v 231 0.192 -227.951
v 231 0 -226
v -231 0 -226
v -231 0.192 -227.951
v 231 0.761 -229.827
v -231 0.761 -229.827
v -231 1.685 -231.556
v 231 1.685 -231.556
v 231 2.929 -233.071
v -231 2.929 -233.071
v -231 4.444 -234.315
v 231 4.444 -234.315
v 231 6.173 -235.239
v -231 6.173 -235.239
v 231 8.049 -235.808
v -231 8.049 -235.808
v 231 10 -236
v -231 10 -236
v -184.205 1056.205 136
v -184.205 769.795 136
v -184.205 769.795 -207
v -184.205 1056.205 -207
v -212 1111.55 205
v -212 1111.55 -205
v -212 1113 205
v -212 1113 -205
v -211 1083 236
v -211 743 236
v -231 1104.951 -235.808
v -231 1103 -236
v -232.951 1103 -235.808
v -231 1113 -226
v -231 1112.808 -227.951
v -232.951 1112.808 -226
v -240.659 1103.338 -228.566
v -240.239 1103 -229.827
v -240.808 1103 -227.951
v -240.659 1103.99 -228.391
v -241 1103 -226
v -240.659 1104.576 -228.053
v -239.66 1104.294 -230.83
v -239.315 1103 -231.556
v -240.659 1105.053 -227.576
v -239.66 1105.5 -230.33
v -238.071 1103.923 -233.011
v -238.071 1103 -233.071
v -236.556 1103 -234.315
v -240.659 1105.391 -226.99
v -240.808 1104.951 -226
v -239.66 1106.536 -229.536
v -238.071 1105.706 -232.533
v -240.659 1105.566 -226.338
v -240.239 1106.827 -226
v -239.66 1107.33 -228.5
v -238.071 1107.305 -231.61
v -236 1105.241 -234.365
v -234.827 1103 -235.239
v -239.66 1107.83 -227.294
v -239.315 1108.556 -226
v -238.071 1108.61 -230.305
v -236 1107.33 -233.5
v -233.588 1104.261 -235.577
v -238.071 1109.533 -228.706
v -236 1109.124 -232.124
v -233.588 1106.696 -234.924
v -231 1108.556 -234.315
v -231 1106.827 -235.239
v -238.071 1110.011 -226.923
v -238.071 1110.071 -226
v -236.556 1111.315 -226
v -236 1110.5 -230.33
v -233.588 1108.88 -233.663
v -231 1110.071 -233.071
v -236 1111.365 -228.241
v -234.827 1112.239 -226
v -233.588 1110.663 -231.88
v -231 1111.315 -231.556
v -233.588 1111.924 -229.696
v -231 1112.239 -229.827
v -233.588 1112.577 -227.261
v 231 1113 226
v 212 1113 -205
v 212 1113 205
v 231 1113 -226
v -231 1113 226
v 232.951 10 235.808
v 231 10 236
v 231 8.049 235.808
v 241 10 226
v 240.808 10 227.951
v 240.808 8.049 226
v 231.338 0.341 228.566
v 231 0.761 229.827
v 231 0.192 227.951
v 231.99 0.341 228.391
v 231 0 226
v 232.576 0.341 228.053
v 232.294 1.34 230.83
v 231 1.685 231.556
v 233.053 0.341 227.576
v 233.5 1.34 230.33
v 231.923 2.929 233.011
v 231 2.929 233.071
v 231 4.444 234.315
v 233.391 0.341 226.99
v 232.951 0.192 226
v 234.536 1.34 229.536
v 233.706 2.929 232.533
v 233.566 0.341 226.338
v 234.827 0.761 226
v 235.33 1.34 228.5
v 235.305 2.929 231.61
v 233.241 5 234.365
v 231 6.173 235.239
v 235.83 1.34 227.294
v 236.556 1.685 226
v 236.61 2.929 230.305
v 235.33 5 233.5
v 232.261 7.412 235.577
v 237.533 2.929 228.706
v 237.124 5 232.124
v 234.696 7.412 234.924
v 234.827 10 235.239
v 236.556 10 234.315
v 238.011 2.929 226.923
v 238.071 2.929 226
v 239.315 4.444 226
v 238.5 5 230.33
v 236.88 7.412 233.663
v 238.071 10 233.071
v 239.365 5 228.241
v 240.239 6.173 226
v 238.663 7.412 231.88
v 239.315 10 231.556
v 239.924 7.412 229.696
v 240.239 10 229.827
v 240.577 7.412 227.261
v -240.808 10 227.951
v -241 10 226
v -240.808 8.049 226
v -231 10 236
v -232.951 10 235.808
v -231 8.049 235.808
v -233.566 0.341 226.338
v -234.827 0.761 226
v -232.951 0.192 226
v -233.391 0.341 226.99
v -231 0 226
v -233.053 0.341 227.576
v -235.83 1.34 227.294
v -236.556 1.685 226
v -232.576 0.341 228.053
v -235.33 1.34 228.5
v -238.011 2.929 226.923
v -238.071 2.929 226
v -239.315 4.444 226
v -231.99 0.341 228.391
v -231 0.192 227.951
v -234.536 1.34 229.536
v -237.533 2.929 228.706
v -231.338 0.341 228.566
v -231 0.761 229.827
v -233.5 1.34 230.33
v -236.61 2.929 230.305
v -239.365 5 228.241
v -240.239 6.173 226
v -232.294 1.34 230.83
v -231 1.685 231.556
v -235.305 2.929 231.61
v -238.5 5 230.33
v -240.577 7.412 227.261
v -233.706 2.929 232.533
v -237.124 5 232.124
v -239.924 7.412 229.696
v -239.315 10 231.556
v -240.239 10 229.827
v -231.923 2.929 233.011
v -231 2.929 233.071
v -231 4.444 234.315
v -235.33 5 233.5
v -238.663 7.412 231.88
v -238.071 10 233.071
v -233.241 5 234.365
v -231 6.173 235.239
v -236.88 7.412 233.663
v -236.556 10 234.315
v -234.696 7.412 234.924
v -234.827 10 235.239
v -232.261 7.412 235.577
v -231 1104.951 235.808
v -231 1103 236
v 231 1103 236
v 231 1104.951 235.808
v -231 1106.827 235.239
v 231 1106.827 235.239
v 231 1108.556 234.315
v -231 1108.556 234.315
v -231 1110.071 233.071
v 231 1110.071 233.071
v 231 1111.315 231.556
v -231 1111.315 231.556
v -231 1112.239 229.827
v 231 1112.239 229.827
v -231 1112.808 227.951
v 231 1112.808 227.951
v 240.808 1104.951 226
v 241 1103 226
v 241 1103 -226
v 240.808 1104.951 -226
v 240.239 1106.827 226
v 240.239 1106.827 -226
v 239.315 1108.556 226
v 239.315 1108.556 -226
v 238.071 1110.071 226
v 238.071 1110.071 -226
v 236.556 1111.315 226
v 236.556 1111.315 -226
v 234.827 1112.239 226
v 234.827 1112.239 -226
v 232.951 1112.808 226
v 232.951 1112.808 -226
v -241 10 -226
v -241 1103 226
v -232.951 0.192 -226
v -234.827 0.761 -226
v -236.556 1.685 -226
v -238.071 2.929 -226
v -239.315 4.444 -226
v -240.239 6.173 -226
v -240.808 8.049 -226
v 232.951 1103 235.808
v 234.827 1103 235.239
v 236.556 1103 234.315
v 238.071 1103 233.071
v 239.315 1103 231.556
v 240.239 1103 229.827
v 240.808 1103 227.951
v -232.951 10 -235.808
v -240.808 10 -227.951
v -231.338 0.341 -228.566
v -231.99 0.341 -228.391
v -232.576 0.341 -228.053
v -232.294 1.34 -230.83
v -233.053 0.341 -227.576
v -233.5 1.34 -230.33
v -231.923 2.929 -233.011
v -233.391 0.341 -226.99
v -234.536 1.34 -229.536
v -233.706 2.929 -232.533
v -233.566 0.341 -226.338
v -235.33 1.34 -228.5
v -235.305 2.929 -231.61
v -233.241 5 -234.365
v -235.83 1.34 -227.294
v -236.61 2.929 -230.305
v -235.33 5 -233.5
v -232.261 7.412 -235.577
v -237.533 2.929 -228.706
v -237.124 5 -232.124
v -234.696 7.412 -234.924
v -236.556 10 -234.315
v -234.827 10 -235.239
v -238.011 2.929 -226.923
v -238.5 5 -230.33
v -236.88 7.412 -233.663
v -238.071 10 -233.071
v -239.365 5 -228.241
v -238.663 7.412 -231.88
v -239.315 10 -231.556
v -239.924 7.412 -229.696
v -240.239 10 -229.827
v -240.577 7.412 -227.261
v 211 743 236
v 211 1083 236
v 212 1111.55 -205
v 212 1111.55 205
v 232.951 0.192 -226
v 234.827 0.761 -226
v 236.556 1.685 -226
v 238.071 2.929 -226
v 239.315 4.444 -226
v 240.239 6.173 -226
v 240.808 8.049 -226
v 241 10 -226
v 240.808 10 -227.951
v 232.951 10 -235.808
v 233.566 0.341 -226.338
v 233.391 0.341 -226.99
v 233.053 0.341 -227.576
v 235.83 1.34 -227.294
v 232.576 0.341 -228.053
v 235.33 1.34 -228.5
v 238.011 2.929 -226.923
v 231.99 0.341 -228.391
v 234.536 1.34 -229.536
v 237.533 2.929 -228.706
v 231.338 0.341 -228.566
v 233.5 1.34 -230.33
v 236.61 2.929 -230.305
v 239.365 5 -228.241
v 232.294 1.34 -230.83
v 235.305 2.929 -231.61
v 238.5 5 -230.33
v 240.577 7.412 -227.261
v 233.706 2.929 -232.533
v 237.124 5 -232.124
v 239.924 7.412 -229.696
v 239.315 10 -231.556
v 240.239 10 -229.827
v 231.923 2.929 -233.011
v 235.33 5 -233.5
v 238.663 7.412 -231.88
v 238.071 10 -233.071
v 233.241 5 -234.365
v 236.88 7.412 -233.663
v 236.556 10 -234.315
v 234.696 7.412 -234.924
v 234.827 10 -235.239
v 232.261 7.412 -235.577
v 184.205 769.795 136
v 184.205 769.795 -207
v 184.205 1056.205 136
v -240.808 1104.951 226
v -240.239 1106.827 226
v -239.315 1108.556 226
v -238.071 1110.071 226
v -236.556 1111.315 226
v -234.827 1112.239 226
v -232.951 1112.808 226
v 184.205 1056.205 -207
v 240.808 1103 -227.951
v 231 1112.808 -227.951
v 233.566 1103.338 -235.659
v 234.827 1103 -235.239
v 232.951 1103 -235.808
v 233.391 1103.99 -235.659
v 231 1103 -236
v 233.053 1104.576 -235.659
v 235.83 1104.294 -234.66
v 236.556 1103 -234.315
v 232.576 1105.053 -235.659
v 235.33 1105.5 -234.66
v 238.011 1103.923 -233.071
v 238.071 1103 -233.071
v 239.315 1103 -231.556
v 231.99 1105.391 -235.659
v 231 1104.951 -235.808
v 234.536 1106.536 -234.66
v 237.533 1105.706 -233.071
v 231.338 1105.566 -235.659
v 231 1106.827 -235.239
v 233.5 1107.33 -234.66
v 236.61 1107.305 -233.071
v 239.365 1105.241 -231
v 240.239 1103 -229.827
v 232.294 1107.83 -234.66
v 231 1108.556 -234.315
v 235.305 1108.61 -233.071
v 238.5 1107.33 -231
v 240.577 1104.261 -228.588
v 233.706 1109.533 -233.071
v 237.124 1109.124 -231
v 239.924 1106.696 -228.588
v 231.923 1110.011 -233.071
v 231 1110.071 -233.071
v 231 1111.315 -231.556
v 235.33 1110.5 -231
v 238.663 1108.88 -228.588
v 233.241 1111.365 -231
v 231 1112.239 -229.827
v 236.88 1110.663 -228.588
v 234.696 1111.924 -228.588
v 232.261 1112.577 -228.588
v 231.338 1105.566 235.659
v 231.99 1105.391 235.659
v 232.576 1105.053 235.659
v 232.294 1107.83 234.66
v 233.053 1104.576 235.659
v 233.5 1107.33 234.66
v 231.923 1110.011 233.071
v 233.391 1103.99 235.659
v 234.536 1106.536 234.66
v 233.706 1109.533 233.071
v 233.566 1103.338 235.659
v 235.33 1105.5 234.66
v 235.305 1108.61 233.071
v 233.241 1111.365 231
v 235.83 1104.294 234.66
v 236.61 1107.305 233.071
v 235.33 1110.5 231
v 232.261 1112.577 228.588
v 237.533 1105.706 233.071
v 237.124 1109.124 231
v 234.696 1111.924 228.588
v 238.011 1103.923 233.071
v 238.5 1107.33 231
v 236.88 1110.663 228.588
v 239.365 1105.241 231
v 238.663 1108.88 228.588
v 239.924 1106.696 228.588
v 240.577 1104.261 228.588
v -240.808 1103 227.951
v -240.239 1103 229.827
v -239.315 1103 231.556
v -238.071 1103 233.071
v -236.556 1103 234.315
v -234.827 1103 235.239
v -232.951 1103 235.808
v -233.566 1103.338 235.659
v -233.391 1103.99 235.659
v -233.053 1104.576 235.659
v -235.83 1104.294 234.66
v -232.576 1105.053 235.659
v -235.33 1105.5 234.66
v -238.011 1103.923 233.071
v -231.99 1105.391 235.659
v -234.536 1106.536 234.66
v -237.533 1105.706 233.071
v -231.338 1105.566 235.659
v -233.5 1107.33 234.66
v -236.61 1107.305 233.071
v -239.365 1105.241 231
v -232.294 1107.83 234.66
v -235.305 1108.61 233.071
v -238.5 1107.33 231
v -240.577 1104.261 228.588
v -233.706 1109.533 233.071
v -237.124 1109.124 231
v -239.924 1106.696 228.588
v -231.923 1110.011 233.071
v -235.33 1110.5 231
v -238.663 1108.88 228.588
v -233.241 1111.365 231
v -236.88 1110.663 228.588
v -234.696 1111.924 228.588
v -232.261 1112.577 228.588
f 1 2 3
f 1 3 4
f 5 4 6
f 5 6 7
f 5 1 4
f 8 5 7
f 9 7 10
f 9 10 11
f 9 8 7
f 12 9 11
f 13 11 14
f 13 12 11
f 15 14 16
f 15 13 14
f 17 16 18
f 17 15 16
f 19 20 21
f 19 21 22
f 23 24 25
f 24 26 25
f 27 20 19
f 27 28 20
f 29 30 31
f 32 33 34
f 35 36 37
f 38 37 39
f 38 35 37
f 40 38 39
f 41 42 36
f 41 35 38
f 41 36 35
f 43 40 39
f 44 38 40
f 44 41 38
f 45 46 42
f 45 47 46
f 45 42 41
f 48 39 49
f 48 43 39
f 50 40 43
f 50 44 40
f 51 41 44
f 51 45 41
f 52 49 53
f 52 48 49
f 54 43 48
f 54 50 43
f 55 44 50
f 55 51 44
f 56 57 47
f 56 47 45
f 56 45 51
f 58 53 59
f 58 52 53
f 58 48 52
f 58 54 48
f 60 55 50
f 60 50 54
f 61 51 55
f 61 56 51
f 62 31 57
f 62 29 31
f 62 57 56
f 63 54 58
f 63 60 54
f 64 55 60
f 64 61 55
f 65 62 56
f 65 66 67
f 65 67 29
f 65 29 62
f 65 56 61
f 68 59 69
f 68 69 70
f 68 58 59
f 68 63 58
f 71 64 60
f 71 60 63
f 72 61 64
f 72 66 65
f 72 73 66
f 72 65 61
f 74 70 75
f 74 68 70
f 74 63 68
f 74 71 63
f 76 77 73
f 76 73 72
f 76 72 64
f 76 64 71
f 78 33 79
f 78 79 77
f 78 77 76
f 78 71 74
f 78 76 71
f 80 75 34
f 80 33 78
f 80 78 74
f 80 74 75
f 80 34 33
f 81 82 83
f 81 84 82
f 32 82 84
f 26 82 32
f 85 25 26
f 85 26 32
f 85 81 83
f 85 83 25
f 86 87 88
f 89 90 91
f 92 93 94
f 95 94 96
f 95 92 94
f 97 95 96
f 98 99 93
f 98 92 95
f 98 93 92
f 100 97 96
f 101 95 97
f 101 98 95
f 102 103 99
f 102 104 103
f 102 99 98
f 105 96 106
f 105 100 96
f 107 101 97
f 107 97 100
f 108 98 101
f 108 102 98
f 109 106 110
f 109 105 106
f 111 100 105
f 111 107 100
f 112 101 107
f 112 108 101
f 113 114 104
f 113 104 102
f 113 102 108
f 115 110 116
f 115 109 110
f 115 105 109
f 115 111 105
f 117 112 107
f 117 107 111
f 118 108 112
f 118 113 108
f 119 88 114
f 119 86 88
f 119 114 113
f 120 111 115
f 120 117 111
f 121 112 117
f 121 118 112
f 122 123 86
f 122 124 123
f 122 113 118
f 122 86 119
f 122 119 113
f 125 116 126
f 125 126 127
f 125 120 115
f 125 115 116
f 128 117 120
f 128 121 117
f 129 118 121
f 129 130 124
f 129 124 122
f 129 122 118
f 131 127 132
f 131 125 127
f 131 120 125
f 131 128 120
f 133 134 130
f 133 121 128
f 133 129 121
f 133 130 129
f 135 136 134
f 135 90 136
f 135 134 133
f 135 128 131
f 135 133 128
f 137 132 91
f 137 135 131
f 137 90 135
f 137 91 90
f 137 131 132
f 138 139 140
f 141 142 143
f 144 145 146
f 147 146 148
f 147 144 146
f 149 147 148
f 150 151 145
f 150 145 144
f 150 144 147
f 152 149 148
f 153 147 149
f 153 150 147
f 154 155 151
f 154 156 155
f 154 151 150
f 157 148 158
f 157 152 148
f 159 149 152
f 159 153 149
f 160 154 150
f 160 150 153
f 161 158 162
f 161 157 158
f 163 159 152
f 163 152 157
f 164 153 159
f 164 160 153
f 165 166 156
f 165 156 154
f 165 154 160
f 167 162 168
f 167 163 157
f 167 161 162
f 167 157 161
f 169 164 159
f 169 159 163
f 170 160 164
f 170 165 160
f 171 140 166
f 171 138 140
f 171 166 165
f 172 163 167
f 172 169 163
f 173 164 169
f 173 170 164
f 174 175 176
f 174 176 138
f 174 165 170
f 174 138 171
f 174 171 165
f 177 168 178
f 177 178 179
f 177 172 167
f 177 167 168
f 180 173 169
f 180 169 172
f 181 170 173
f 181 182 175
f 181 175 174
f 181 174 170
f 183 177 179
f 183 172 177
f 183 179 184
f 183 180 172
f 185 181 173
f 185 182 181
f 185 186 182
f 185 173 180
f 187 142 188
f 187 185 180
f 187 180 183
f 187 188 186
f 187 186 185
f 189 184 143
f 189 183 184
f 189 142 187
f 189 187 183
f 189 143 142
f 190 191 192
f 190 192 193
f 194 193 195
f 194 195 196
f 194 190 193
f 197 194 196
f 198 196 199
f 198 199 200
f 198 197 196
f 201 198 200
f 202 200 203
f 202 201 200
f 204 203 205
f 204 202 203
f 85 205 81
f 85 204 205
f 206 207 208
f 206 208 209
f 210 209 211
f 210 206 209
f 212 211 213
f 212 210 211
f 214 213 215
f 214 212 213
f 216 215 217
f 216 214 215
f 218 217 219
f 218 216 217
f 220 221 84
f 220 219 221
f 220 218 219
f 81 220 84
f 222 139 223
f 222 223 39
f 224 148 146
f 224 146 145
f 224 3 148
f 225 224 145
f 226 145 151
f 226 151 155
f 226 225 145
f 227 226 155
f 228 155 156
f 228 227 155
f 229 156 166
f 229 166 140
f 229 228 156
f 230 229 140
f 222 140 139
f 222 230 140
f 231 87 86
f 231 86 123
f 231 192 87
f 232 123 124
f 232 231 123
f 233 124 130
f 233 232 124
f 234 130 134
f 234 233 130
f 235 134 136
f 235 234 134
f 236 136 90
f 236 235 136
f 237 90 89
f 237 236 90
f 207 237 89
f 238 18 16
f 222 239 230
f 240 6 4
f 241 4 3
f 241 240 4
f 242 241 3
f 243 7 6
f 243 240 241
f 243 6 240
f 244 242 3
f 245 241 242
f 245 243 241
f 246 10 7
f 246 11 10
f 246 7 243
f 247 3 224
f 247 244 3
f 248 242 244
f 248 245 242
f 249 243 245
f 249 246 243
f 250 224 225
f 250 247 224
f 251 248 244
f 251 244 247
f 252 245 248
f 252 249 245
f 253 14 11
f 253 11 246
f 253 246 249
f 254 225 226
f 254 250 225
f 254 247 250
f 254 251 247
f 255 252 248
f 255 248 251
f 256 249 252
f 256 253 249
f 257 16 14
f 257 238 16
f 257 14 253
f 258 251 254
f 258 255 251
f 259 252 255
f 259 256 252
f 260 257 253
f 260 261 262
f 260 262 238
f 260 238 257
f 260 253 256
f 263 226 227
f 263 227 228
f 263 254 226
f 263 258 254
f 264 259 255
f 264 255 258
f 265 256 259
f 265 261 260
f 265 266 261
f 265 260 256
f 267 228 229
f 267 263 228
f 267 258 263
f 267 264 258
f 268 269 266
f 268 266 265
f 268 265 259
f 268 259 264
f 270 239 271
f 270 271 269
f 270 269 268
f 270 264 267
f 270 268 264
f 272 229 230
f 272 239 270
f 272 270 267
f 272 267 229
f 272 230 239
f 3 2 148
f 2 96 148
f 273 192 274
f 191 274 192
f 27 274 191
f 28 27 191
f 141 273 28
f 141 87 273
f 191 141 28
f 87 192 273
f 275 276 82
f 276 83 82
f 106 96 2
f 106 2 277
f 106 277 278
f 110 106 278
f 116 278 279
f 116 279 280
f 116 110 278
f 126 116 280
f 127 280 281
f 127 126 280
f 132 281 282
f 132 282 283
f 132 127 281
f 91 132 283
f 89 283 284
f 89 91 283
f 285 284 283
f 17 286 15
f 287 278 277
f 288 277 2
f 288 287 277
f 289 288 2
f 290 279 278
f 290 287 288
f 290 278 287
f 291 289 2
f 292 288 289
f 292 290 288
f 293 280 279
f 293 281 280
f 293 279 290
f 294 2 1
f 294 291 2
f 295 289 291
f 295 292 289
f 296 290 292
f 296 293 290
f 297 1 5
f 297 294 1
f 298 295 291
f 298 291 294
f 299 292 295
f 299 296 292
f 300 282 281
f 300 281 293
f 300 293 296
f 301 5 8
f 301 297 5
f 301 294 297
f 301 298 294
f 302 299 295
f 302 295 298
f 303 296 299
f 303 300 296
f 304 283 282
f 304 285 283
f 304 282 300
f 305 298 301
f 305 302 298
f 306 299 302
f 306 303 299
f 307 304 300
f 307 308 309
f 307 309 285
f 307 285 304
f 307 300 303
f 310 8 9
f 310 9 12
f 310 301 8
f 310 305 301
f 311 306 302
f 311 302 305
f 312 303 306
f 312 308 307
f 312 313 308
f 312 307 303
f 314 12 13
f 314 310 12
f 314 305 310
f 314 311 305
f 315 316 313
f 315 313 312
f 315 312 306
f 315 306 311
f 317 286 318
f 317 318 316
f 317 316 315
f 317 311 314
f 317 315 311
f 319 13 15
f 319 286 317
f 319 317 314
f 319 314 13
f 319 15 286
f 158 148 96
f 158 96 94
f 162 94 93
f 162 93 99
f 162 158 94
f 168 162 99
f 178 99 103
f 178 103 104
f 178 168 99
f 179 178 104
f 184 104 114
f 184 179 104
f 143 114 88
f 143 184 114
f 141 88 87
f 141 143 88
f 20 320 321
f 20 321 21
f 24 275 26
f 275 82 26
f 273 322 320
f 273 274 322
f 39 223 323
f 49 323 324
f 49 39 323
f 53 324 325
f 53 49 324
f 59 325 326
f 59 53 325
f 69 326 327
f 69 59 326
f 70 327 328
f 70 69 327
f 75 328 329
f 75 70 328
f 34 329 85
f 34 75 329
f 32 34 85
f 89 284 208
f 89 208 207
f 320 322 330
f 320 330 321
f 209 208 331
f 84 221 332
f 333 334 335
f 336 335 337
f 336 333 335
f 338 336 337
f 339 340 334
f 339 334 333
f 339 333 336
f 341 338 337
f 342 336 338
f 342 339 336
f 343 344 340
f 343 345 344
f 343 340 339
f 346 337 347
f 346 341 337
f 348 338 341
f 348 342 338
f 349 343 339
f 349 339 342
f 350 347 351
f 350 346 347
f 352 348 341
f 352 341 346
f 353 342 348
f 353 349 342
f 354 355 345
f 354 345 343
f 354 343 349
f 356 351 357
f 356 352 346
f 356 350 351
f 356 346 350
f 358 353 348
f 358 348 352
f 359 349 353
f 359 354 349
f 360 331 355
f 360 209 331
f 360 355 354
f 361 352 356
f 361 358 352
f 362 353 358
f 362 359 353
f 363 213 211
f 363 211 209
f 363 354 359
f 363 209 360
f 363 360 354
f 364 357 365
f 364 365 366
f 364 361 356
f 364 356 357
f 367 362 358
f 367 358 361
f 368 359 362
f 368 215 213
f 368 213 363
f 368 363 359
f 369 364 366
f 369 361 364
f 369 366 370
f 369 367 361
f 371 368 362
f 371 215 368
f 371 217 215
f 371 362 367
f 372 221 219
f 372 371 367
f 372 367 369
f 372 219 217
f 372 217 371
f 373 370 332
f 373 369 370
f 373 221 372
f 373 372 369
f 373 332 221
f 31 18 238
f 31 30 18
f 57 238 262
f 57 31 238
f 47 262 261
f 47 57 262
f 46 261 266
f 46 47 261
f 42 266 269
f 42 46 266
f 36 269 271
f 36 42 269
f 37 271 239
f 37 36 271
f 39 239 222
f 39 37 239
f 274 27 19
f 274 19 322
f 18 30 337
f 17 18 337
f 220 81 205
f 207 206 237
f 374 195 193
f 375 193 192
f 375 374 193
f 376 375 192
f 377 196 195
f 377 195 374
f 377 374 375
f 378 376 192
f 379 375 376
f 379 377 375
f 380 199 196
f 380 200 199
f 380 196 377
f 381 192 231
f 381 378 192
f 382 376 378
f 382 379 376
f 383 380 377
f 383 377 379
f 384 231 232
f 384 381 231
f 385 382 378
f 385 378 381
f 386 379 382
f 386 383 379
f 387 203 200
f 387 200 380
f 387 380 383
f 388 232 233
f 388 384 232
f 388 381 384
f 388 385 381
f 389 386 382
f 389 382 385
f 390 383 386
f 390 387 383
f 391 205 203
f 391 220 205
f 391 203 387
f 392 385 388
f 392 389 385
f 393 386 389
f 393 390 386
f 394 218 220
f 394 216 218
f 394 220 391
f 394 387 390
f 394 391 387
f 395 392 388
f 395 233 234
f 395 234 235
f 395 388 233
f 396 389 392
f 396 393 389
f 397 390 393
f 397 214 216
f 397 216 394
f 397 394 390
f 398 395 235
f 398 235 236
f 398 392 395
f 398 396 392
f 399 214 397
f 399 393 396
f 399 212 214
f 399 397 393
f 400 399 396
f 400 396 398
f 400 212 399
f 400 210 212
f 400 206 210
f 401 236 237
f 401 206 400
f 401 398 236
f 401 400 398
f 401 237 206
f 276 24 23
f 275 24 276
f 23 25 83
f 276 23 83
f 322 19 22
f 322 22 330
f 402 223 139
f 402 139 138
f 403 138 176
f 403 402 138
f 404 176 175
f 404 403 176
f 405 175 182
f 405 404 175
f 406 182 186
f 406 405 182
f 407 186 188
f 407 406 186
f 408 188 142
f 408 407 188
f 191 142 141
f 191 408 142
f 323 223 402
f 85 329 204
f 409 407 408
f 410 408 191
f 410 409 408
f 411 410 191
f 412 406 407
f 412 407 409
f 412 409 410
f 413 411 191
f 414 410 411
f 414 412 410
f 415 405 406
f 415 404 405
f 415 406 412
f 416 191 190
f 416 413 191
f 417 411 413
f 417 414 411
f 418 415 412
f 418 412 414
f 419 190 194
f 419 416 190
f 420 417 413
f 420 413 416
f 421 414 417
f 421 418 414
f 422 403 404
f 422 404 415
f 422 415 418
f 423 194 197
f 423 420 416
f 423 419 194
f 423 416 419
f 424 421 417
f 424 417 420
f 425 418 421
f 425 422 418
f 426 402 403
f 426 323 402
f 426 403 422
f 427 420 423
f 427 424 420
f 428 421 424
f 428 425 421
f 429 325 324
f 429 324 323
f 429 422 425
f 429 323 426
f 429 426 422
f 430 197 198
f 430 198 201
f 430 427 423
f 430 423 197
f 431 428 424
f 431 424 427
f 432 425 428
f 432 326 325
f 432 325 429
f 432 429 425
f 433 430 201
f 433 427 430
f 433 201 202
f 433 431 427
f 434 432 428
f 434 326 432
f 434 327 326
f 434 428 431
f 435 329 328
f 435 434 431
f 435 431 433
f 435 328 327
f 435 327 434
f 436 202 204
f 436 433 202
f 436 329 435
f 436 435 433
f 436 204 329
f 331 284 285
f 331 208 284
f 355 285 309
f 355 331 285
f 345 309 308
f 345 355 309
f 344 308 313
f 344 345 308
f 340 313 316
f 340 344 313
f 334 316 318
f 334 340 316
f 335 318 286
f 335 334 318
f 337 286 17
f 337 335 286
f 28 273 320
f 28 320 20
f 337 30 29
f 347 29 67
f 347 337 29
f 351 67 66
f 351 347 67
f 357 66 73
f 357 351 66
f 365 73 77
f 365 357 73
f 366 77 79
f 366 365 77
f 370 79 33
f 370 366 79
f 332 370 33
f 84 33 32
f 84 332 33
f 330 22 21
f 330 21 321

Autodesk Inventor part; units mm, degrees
ref_plane "YZ Plane" through (0, 0, 0) normal (1, 0, 0) x (0, 1, 0)
ref_plane "XZ Plane" through (0, 0, 0) normal (0, 1, 0) x (-1, 0, 0)
ref_plane "XY Plane" through (0, 0, 0) normal (0, 0, 1) x (1, 0, 0)
sketch "スケッチ1" plane through (0, 0, 0) normal (0, 1, 0) x (-1, 0, 0)
  line L0 (241, -236) -> (-241, -236)
  line L1 (-241, -236) -> (-241, 236)
  line L2 (-241, 236) -> (241, 236)
  line L3 (241, 236) -> (241, -236)
  line L4 (241, -236) -> (-241, 236) construction
  line L5 (-241, -236) -> (241, 236) construction
  point P0 (0, 0)
  dimension "d0" = 482
  dimension "d1" = 472
extrude "押し出し1" add sketch "スケッチ1" along normal blind 1113
fillet "フィレット1" radius 10 12 edges at (241, 1113, 0) (0, 1113, -236) (-241, 1113, 0) (0, 1113, 236) (-241, 556.5, 236) (241, 556.5, 236) (241, 556.5, -236) (-241, 556.5, -236) (0, 0, 236) (-241, 0, 0) (0, 0, -236) (241, 0, 0)
sketch "スケッチ2" plane through (0, 1113, 0) normal (0, 1, 0) x (1, 0, 0)
  line L0 (-212, -205) -> (212, -205)
  line L1 (212, -205) -> (212, 205)
  line L2 (212, 205) -> (-212, 205)
  line L3 (-212, 205) -> (-212, -205)
  line L4 (-212, -205) -> (212, 205) construction
  line L5 (212, -205) -> (-212, 205) construction
  point P0 (0, 0)
  dimension "d5" = 424
  dimension "d6" = 410
extrude "押し出し2" cut sketch "スケッチ2" against normal blind 1.45
sketch "スケッチ3" plane through (-231, 1103, 236) normal (0, 0, 1) x (1, 0, 0)
  line L0 (20, -20) -> (442, -20)
  line L1 (442, -20) -> (442, -360)
  line L2 (442, -360) -> (20, -360)
  line L3 (20, -360) -> (20, -20)
  point P0 (231, -1103)
  dimension "d9" = 422
  dimension "d10" = 340
extrude "押し出し3" cut sketch "スケッチ3" against normal blind 100
draft "面の勾配1" angle 15 pull direction (0, 0, 1) faces at (70.3333, 743, 202.6667) fixed edges at (0, 743, 236)
draft "面の勾配2" angle 15 pull direction (0, 0, 1) faces at (-211, 865.265, 202.6667) fixed edges at (-211, 913, 236)
draft "面の勾配3" angle 15 pull direction (0, 0, 1) faces at (-61.4017, 1083, 202.6667) fixed edges at (0, 1083, 236)
draft "面の勾配4" angle 15 pull direction (0, 0, 1) faces at (211, 865.265, 202.6667) fixed edges at (211, 913, 236)
sketch "スケッチ4" plane through (-231, 1103, 136) normal (0, 0, 1) x (1, 0, 0)
  line L0 (46.7949, -46.7949) -> (415.2051, -46.7949)
  line L1 (415.2051, -46.7949) -> (415.2051, -333.2051)
  line L2 (415.2051, -333.2051) -> (46.7949, -333.2051)
  line L3 (46.7949, -333.2051) -> (46.7949, -46.7949)
  point P0 (231, -1103)
extrude "押し出し4" cut sketch "スケッチ4" against normal blind 343
properties part number "box"
